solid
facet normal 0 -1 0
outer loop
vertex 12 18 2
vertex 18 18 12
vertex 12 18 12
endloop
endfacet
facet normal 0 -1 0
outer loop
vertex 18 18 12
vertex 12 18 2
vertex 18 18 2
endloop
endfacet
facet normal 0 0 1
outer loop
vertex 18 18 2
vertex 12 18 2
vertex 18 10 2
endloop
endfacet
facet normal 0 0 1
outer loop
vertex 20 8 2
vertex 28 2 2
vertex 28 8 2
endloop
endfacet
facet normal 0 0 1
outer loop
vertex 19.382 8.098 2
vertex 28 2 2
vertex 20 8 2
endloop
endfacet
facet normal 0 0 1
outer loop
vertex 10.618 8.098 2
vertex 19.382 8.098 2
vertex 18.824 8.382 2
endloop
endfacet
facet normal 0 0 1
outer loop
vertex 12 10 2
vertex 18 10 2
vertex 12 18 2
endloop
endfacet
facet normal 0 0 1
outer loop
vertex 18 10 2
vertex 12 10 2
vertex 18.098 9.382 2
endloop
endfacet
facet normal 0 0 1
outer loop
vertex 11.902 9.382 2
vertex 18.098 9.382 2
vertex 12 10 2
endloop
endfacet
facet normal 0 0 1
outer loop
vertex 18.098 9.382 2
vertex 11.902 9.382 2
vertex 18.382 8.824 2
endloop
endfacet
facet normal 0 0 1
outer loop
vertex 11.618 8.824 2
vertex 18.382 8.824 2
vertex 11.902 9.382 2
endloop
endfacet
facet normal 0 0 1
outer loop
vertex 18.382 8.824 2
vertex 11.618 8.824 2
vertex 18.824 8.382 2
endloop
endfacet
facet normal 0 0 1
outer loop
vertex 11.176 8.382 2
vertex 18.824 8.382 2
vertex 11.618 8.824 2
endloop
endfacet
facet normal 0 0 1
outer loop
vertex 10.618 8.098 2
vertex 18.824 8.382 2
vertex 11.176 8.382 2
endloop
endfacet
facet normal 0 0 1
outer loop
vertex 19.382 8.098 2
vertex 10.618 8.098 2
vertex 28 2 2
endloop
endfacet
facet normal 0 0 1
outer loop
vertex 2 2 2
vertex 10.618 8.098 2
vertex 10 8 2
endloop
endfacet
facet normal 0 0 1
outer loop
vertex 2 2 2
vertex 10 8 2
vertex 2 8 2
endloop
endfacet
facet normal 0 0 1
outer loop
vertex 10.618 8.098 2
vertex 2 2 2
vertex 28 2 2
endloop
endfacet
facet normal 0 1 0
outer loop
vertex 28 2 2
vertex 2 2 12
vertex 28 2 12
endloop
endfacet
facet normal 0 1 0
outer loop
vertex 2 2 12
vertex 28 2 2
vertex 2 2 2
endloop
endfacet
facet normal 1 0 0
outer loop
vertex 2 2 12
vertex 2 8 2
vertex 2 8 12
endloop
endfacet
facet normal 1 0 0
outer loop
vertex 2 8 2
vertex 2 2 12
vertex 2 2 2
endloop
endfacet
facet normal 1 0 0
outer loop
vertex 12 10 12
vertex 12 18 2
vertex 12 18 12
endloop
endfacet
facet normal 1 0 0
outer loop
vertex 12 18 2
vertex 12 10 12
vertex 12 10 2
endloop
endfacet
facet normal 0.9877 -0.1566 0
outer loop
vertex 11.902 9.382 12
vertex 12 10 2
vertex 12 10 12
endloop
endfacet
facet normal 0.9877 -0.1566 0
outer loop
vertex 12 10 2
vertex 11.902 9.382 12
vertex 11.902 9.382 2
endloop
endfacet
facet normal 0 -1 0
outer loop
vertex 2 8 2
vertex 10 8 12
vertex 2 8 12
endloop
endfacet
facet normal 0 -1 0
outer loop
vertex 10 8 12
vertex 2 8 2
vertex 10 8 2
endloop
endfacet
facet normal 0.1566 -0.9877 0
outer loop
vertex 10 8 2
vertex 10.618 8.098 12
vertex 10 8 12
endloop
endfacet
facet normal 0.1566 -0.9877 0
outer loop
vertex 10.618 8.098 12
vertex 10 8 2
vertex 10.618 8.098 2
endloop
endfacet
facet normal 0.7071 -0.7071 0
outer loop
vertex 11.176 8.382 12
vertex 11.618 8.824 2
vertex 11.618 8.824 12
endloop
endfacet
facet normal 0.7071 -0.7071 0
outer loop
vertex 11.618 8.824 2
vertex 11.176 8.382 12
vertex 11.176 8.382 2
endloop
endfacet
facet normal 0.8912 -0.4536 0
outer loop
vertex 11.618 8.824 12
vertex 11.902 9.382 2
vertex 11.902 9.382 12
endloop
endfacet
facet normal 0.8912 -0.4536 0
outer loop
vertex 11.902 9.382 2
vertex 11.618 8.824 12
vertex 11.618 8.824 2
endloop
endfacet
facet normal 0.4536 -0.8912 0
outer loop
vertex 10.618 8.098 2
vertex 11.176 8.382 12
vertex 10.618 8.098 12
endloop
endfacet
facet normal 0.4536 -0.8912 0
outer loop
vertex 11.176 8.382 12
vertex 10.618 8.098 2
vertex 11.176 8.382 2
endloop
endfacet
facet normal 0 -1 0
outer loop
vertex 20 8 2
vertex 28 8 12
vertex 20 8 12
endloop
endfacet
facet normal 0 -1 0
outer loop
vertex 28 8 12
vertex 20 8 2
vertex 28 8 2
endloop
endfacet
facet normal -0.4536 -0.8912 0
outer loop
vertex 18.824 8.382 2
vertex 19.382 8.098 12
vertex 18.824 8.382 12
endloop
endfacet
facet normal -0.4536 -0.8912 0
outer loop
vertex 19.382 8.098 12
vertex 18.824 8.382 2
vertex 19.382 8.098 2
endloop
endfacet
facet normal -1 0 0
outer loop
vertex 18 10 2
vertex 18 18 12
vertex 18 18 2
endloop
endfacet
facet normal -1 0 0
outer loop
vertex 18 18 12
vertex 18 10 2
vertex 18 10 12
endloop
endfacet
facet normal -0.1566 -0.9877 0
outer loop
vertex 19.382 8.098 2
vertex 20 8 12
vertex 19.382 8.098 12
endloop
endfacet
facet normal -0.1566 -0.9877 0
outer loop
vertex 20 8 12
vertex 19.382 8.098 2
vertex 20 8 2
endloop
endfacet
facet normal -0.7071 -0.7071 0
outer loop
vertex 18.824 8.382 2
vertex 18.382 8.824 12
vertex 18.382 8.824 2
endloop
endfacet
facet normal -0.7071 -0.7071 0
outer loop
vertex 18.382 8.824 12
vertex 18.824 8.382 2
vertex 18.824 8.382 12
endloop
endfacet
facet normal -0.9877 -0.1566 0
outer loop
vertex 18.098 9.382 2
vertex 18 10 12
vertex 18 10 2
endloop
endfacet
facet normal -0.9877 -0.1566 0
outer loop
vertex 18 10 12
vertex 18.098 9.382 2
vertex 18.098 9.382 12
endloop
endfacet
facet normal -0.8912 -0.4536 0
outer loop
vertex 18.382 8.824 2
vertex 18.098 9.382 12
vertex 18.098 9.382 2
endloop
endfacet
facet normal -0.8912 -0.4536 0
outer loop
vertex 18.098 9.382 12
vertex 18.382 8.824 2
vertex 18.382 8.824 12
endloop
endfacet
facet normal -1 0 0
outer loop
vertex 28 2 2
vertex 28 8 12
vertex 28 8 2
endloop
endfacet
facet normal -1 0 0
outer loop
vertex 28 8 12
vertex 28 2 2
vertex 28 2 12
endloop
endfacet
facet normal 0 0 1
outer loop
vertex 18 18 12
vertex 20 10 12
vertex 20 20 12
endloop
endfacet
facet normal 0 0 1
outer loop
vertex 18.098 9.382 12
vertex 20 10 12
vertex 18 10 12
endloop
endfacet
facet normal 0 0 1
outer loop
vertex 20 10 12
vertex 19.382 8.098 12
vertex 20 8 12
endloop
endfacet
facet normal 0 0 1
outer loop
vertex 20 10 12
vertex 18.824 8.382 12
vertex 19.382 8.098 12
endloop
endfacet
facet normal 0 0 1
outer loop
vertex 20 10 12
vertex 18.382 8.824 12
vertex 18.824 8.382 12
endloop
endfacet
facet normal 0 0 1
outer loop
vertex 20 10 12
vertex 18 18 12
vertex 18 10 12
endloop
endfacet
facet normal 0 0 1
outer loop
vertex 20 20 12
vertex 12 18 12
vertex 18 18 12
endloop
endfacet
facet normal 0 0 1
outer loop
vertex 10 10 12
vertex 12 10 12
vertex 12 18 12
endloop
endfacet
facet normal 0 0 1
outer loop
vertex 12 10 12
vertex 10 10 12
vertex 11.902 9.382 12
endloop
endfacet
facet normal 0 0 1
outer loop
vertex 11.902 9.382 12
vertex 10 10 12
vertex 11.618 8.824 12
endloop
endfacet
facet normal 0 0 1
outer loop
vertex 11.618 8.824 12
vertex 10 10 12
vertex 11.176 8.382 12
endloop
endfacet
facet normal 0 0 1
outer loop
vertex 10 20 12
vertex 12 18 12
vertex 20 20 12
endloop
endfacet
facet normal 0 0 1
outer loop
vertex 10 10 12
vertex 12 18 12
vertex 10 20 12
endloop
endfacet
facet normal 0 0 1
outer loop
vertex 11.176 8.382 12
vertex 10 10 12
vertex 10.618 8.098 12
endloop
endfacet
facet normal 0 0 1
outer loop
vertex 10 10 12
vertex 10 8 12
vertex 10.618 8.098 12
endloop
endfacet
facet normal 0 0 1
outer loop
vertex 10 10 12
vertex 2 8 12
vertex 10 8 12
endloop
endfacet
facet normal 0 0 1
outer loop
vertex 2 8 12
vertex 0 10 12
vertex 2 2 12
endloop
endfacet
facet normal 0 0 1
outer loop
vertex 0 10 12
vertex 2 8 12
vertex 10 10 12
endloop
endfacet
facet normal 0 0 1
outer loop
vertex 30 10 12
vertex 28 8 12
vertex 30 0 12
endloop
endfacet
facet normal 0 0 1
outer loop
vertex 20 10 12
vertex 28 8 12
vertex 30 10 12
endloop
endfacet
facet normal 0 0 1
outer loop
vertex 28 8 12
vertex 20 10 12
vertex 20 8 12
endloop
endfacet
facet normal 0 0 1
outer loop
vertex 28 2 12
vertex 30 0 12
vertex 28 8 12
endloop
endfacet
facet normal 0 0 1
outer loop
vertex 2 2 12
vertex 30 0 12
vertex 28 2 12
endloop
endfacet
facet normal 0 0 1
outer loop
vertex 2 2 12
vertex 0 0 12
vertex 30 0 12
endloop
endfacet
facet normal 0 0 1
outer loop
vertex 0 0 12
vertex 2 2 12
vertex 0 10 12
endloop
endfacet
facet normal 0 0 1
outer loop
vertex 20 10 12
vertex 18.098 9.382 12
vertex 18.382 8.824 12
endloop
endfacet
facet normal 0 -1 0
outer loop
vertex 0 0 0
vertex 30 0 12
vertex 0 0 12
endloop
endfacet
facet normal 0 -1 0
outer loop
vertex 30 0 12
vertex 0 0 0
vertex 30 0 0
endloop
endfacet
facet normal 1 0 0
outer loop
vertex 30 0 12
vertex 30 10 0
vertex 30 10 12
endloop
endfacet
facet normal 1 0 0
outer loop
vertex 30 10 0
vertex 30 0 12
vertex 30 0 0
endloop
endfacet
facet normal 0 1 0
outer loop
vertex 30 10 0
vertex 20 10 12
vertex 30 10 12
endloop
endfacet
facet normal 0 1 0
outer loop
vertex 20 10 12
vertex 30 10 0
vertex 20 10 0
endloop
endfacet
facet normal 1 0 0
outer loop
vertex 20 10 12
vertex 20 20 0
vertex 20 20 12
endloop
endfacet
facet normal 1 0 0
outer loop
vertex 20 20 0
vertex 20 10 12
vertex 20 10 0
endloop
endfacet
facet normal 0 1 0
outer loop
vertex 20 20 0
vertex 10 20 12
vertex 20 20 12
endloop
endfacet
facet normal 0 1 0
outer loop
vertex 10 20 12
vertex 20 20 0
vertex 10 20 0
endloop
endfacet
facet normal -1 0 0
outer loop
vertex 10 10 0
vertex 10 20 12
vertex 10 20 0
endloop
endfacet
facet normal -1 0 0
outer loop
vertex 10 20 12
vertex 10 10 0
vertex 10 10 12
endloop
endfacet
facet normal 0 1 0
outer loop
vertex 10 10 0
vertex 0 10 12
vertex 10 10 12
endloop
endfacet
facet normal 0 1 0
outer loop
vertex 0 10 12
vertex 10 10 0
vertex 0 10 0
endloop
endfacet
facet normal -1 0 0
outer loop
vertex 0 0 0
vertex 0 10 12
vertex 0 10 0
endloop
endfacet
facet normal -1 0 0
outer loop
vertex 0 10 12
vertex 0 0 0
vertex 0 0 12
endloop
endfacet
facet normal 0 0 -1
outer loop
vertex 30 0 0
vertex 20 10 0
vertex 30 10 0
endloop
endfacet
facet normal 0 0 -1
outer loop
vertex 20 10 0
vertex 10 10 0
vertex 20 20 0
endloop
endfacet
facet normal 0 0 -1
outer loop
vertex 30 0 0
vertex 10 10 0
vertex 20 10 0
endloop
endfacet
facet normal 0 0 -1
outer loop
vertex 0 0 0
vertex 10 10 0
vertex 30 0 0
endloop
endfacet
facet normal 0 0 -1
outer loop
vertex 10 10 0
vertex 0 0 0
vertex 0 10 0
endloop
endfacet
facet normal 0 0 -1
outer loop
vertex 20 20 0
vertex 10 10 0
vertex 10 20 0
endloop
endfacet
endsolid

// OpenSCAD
//CUSTOMIZER VARIABLES

// Tetris shape
letter = 5;  // [0:I,1:J,2:L,3:O,4:S,5:T,6:Z]
// size of a unit square 
base=10;
// height 
height=10;
// thickness of sizes and base for outline and box
thickness=2;
// type of object to be generated
type = 2;  // [1:solid,2:box,3:outline]

//CUSTOMIZER VARIABLES END

module solid(shape,base,height) {
        linear_extrude(height=height) 
           for (i = [0:3 ]) 
               assign(sq= shape[i] )
                   translate([base*sq[0] ,  base * sq[1]] ) square(base);
}

module outline(shape,base,height,thickness)  {
        intersection() {
                solid(shape,base,height);
                minkowski() {
                difference () {
                   translate ([0,0,height/2]) cube([200,200,height] ,center=true);
                   translate([0,0,-eps]) solid(shape,base,height+ 2 * eps);
               }
               cylinder(r=thickness);
            }
        }
}

module box(shape,base,height,thickness) {
     union () {
        solid(shape,base,thickness);
        translate ([0,0,thickness]) outline(shape,base,height,thickness);
     }
}

module solids (base,height) {
for (j = [0:6]){
      translate ([0,j*3*base,0])
      assign (piece = tetris[j])   assign (shape = piece[2] )
      color (piece[1]) solid(shape,base,height);
    }
};

module outlines(base,height,thickness) {
  for (j = [0:6]) {
      translate ([0,j*3*base,0])
      assign (piece = tetris [j])  assign (shape = piece[2] )
      outline(shape,base,height,thickness);
    }
}

module boxes(base,height,thickness) {
  for (j = [0:6]) {
      translate ([0,j*3*base,0])
      assign (piece = tetris [j])  assign (shape = piece[2] )
      box(shape,base,height,thickness);
    }
}

tetris =[
              ["I" , "cyan",  [[0,0],[1,0],[2,0],[3,0]] ],
              ["J" , "blue",  [[0,0],[1,0],[2,0],[0,1]] ],
              ["L" ,"orange",  [[0,0],[1,0],[2,0],[2,1]] ],
              ["O", "yellow", [[0,0],[1,0],[1,1],[0,1]] ],
              ["S" ,"green", [[0,0],[1,0],[1,1],[2,1]] ],
              ["T" , "purple", [[0,0],[1,0],[2,0],[1,1]] ],
              ["Z" , "red", [[0,1],[1,1],[1,0],[2,0]] ]
           ] ;

//solids(10,5);
//outlines(10,5,2);
//boxes(10,5,2);

$fn=20;
eps=1;

piece= tetris[letter];
shape  =piece[2];
if (type == 1)  solid(shape,base,height);
else if (type==2) box(shape,base,height,thickness);
else if (type== 3) outline(shape,base,height,thickness);
